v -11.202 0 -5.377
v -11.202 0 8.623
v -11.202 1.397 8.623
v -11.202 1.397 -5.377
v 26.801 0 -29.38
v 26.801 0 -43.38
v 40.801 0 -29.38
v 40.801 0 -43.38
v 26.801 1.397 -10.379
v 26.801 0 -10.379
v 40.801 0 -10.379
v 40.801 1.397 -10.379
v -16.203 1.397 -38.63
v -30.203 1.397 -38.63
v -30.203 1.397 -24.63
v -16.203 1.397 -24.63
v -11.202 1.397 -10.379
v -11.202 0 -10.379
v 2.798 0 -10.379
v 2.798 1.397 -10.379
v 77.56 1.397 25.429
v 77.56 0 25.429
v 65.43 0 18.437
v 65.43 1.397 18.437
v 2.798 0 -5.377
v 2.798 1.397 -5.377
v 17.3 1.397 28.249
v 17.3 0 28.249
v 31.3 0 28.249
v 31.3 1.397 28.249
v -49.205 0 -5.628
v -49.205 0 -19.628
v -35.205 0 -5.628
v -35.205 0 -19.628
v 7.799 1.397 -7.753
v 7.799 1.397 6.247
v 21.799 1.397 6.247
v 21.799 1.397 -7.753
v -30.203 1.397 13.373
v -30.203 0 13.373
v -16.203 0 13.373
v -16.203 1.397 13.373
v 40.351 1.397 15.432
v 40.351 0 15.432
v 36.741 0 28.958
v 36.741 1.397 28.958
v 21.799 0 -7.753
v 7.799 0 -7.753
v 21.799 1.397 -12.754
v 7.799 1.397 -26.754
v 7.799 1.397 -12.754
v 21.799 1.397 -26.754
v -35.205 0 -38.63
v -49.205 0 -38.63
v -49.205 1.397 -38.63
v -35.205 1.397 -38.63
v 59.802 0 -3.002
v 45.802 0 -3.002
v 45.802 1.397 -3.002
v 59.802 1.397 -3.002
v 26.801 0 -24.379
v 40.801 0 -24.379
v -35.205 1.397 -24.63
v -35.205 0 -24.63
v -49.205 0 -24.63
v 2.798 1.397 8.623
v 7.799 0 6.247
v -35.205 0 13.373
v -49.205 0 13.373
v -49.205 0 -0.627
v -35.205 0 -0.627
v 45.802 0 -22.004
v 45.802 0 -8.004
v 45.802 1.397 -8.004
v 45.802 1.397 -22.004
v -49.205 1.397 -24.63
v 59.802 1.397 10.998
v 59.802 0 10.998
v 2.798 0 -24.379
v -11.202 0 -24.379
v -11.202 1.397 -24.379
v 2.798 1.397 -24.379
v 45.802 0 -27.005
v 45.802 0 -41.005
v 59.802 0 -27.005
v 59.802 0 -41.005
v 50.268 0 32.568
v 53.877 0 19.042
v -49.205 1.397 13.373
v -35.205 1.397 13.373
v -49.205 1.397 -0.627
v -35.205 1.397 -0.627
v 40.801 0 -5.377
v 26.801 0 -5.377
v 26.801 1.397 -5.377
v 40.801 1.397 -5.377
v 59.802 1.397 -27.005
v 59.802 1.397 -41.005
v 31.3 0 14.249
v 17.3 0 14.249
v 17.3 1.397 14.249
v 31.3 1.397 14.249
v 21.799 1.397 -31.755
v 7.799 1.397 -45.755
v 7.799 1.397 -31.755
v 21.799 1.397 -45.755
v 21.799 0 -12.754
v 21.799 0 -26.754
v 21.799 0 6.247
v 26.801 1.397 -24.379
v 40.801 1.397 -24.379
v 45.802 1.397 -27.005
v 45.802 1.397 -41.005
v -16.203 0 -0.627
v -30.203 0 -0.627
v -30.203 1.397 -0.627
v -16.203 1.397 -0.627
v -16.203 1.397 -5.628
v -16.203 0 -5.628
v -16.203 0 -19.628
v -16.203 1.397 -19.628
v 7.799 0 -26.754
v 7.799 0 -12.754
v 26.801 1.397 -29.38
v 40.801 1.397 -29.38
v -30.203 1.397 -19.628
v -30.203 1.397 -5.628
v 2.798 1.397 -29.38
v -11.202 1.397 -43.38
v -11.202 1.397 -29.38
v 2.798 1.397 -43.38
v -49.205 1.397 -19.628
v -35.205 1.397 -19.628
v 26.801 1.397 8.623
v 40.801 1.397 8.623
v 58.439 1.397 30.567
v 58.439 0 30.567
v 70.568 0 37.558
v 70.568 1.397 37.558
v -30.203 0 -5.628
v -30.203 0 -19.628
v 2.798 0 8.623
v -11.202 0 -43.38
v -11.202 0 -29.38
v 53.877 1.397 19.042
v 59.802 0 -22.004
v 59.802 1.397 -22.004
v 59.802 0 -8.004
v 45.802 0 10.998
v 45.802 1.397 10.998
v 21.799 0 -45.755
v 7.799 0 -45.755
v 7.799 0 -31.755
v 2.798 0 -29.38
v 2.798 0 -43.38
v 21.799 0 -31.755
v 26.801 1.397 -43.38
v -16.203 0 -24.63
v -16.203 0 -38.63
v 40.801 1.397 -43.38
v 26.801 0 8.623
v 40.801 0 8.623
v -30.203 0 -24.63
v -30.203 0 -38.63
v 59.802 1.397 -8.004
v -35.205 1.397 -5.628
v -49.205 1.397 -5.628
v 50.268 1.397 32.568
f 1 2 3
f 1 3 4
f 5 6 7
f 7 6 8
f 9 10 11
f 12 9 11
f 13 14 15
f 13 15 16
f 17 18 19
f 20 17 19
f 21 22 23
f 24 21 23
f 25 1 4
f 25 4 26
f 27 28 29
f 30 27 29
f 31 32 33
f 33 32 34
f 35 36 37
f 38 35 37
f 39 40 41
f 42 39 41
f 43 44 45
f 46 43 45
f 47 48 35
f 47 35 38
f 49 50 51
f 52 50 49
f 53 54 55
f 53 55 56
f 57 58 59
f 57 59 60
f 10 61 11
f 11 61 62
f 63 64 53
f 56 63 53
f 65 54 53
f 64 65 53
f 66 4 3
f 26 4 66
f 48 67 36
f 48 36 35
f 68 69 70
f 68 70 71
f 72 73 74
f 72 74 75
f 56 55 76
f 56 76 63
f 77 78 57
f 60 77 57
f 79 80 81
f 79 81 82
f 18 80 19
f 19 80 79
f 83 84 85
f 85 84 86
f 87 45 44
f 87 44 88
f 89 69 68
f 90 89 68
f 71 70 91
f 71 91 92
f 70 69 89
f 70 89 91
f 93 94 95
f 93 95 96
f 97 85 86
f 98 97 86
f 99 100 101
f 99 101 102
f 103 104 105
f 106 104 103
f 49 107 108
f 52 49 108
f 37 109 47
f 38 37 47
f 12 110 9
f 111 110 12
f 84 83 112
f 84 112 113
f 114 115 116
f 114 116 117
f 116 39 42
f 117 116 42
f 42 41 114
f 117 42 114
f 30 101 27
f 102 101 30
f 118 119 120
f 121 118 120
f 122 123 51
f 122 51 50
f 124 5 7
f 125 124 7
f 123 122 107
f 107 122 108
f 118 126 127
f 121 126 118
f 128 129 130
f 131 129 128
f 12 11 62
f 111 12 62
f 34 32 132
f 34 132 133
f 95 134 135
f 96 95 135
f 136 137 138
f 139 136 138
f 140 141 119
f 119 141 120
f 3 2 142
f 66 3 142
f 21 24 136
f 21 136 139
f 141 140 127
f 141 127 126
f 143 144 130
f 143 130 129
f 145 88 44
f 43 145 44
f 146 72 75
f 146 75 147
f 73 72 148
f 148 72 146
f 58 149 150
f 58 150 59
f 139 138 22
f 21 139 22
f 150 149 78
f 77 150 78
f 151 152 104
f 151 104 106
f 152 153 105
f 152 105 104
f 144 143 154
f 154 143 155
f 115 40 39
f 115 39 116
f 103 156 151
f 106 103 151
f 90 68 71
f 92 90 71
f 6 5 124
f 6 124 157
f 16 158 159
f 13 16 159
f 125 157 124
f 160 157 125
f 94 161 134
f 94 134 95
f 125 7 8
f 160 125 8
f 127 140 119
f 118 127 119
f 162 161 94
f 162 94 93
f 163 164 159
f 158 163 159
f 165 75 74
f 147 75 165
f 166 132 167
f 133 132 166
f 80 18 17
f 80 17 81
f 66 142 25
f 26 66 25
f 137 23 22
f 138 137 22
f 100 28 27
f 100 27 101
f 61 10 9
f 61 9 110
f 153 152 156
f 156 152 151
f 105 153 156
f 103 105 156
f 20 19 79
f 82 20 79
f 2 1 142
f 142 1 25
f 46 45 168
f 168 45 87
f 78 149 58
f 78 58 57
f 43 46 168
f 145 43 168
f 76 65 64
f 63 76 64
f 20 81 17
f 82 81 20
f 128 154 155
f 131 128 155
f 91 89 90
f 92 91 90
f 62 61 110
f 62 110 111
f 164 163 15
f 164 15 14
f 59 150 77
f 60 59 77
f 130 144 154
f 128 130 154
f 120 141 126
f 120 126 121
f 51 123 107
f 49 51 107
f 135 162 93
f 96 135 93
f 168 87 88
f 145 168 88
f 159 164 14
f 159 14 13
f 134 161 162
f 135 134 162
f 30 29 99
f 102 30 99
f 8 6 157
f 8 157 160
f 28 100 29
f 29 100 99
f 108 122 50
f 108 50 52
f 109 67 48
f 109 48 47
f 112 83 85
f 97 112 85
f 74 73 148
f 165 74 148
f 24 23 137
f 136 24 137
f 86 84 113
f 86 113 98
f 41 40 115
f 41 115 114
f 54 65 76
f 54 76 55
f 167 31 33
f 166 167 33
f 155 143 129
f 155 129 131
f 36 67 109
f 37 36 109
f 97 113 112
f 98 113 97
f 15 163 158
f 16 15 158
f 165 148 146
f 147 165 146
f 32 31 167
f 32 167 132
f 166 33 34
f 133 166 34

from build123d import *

# Parameters (mm, degrees)
SKETCH1_W              = 14
SKETCH1_H              = 14
BOSS_EXTRUDE1_DEPTH    = 1.397
BOSS_EXTRUDE1_2_DEPTH  = 1.397
BOSS_EXTRUDE1_3_DEPTH  = 1.397
BOSS_EXTRUDE1_4_DEPTH  = 1.397
BOSS_EXTRUDE1_5_DEPTH  = 1.397
BOSS_EXTRUDE1_6_DEPTH  = 1.397
BOSS_EXTRUDE1_7_DEPTH  = 1.397
BOSS_EXTRUDE1_8_DEPTH  = 1.397
BOSS_EXTRUDE1_9_DEPTH  = 1.397
BOSS_EXTRUDE1_10_DEPTH = 1.397
BOSS_EXTRUDE1_11_DEPTH = 1.397
BOSS_EXTRUDE1_12_DEPTH = 1.397
BOSS_EXTRUDE1_13_DEPTH = 1.397
BOSS_EXTRUDE1_14_DEPTH = 1.397
BOSS_EXTRUDE1_15_DEPTH = 1.397
BOSS_EXTRUDE1_16_DEPTH = 1.397
BOSS_EXTRUDE1_17_DEPTH = 1.397
BOSS_EXTRUDE1_18_DEPTH = 1.397
BOSS_EXTRUDE1_19_DEPTH = 1.397
BOSS_EXTRUDE1_20_DEPTH = 1.397
BOSS_EXTRUDE1_21_DEPTH = 1.397


with BuildPart() as part:
    # Sketch1 → Boss-Extrude1 (new body)
    with BuildSketch(Plane(origin=(0, 0, 0), x_dir=(1, 0, 0), z_dir=(0, 1, 0))):
        with Locations((-42.205271238, 31.629821093)):
            Rectangle(SKETCH1_W, SKETCH1_H)
    extrude(amount=BOSS_EXTRUDE1_DEPTH)


with BuildPart() as body_2:
    # Sketch1 → Boss-Extrude1 2 (new body)
    with BuildSketch(Plane(origin=(0, 0, 0), x_dir=(1, 0, 0), z_dir=(0, 1, 0))):
        with Locations((-42.205271238, 12.628473437)):
            Rectangle(SKETCH1_W, SKETCH1_H)
    extrude(amount=BOSS_EXTRUDE1_2_DEPTH)


with BuildPart() as body_3:
    # Sketch1 → Boss-Extrude1 3 (new body)
    with BuildSketch(Plane(origin=(0, 0, 0), x_dir=(1, 0, 0), z_dir=(0, 1, 0))):
        with Locations((-42.205271238, -6.372874219)):
            Rectangle(SKETCH1_W, SKETCH1_H)
    extrude(amount=BOSS_EXTRUDE1_3_DEPTH)


with BuildPart() as body_4:
    # Sketch1 → Boss-Extrude1 4 (new body)
    with BuildSketch(Plane(origin=(0, 0, 0), x_dir=(1, 0, 0), z_dir=(0, 1, 0))):
        with Locations((-23.203415546, 31.629821093)):
            Rectangle(SKETCH1_W, SKETCH1_H)
    extrude(amount=BOSS_EXTRUDE1_4_DEPTH)


with BuildPart() as body_5:
    # Sketch1 → Boss-Extrude1 5 (new body)
    with BuildSketch(Plane(origin=(0, 0, 0), x_dir=(1, 0, 0), z_dir=(0, 1, 0))):
        with Locations((-23.203415546, 12.628473437)):
            Rectangle(SKETCH1_W, SKETCH1_H)
    extrude(amount=BOSS_EXTRUDE1_5_DEPTH)


with BuildPart() as body_6:
    # Sketch1 → Boss-Extrude1 6 (new body)
    with BuildSketch(Plane(origin=(0, 0, 0), x_dir=(1, 0, 0), z_dir=(0, 1, 0))):
        with Locations((-23.203415546, -6.372874219)):
            Rectangle(SKETCH1_W, SKETCH1_H)
    extrude(amount=BOSS_EXTRUDE1_6_DEPTH)


with BuildPart() as body_7:
    # Sketch1 → Boss-Extrude1 7 (new body)
    with BuildSketch(Plane(origin=(0, 0, 0), x_dir=(1, 0, 0), z_dir=(0, 1, 0))):
        with Locations((-4.20206789, 36.380158007)):
            Rectangle(SKETCH1_W, SKETCH1_H)
    extrude(amount=BOSS_EXTRUDE1_7_DEPTH)


with BuildPart() as body_8:
    # Sketch1 → Boss-Extrude1 8 (new body)
    with BuildSketch(Plane(origin=(0, 0, 0), x_dir=(1, 0, 0), z_dir=(0, 1, 0))):
        with Locations((-4.20206789, 17.378810351)):
            Rectangle(SKETCH1_W, SKETCH1_H)
    extrude(amount=BOSS_EXTRUDE1_8_DEPTH)


with BuildPart() as body_9:
    # Sketch1 → Boss-Extrude1 9 (new body)
    with BuildSketch(Plane(origin=(0, 0, 0), x_dir=(1, 0, 0), z_dir=(0, 1, 0))):
        with Locations((-4.20206789, -1.622537305)):
            Rectangle(SKETCH1_W, SKETCH1_H)
    extrude(amount=BOSS_EXTRUDE1_9_DEPTH)


with BuildPart() as body_10:
    # Sketch1 → Boss-Extrude1 10 (new body)
    with BuildSketch(Plane(origin=(0, 0, 0), x_dir=(1, 0, 0), z_dir=(0, 1, 0))):
        with Locations((14.799279766, 38.755326464)):
            Rectangle(SKETCH1_W, SKETCH1_H)
    extrude(amount=BOSS_EXTRUDE1_10_DEPTH)


with BuildPart() as body_11:
    # Sketch1 → Boss-Extrude1 11 (new body)
    with BuildSketch(Plane(origin=(0, 0, 0), x_dir=(1, 0, 0), z_dir=(0, 1, 0))):
        with Locations((14.799279766, 19.753978808)):
            Rectangle(SKETCH1_W, SKETCH1_H)
    extrude(amount=BOSS_EXTRUDE1_11_DEPTH)


with BuildPart() as body_12:
    # Sketch1 → Boss-Extrude1 12 (new body)
    with BuildSketch(Plane(origin=(0, 0, 0), x_dir=(1, 0, 0), z_dir=(0, 1, 0))):
        with Locations((14.799279766, 0.752631152)):
            Rectangle(SKETCH1_W, SKETCH1_H)
    extrude(amount=BOSS_EXTRUDE1_12_DEPTH)


with BuildPart() as body_13:
    # Sketch1 → Boss-Extrude1 13 (new body)
    with BuildSketch(Plane(origin=(0, 0, 0), x_dir=(1, 0, 0), z_dir=(0, 1, 0))):
        with Locations((33.800627421, 36.380158007)):
            Rectangle(SKETCH1_W, SKETCH1_H)
    extrude(amount=BOSS_EXTRUDE1_13_DEPTH)


with BuildPart() as body_14:
    # Sketch1 → Boss-Extrude1 14 (new body)
    with BuildSketch(Plane(origin=(0, 0, 0), x_dir=(1, 0, 0), z_dir=(0, 1, 0))):
        with Locations((33.800627421, 17.378810351)):
            Rectangle(SKETCH1_W, SKETCH1_H)
    extrude(amount=BOSS_EXTRUDE1_14_DEPTH)


with BuildPart() as body_15:
    # Sketch1 → Boss-Extrude1 15 (new body)
    with BuildSketch(Plane(origin=(0, 0, 0), x_dir=(1, 0, 0), z_dir=(0, 1, 0))):
        with Locations((33.800627421, -1.622537305)):
            Rectangle(SKETCH1_W, SKETCH1_H)
    extrude(amount=BOSS_EXTRUDE1_15_DEPTH)


with BuildPart() as body_16:
    # Sketch1 → Boss-Extrude1 16 (new body)
    with BuildSketch(Plane(origin=(0, 0, 0), x_dir=(1, 0, 0), z_dir=(0, 1, 0))):
        with Locations((52.801975077, 34.00498955)):
            Rectangle(SKETCH1_W, SKETCH1_H)
    extrude(amount=BOSS_EXTRUDE1_16_DEPTH)


with BuildPart() as body_17:
    # Sketch1 → Boss-Extrude1 17 (new body)
    with BuildSketch(Plane(origin=(0, 0, 0), x_dir=(1, 0, 0), z_dir=(0, 1, 0))):
        with Locations((52.801975077, 15.003641894)):
            Rectangle(SKETCH1_W, SKETCH1_H)
    extrude(amount=BOSS_EXTRUDE1_17_DEPTH)


with BuildPart() as body_18:
    # Sketch1 → Boss-Extrude1 18 (new body)
    with BuildSketch(Plane(origin=(0, 0, 0), x_dir=(1, 0, 0), z_dir=(0, 1, 0))):
        with Locations((52.801975077, -3.997705762)):
            Rectangle(SKETCH1_W, SKETCH1_H)
    extrude(amount=BOSS_EXTRUDE1_18_DEPTH)


with BuildPart() as body_19:
    # Sketch1 → Boss-Extrude1 19 (new body)
    with BuildSketch(Plane(origin=(0, 0, 0), x_dir=(1, 0, 0), z_dir=(0, 1, 0))):
        with Locations((24.299953593, -21.248929292)):
            Rectangle(SKETCH1_W, SKETCH1_H)
    extrude(amount=BOSS_EXTRUDE1_19_DEPTH)


with BuildPart() as body_20:
    # Sketch1 → Boss-Extrude1 20 (new body)
    with BuildSketch(Plane(origin=(0, 0, 0), x_dir=(1, 0, 0), z_dir=(0, 1, 0))):
        Polygon((40.350827086, -15.431778744), (36.741101467, -28.958414724), (50.267737448, -32.568140343), (53.877463067, -19.041504363), align=None)
    extrude(amount=BOSS_EXTRUDE1_20_DEPTH)


with BuildPart() as body_21:
    # Sketch1 → Boss-Extrude1 21 (new body)
    with BuildSketch(Plane(origin=(0, 0, 0), x_dir=(1, 0, 0), z_dir=(0, 1, 0))):
        Polygon((65.430479703, -18.437424217), (58.438754316, -30.566553457), (70.567883556, -37.558278844), (77.559608943, -25.429149604), align=None)
    extrude(amount=BOSS_EXTRUDE1_21_DEPTH)


solid = Compound([part.part, body_2.part, body_3.part, body_4.part, body_5.part, body_6.part, body_7.part, body_8.part, body_9.part, body_10.part, body_11.part, body_12.part, body_13.part, body_14.part, body_15.part, body_16.part, body_17.part, body_18.part, body_19.part, body_20.part, body_21.part])
